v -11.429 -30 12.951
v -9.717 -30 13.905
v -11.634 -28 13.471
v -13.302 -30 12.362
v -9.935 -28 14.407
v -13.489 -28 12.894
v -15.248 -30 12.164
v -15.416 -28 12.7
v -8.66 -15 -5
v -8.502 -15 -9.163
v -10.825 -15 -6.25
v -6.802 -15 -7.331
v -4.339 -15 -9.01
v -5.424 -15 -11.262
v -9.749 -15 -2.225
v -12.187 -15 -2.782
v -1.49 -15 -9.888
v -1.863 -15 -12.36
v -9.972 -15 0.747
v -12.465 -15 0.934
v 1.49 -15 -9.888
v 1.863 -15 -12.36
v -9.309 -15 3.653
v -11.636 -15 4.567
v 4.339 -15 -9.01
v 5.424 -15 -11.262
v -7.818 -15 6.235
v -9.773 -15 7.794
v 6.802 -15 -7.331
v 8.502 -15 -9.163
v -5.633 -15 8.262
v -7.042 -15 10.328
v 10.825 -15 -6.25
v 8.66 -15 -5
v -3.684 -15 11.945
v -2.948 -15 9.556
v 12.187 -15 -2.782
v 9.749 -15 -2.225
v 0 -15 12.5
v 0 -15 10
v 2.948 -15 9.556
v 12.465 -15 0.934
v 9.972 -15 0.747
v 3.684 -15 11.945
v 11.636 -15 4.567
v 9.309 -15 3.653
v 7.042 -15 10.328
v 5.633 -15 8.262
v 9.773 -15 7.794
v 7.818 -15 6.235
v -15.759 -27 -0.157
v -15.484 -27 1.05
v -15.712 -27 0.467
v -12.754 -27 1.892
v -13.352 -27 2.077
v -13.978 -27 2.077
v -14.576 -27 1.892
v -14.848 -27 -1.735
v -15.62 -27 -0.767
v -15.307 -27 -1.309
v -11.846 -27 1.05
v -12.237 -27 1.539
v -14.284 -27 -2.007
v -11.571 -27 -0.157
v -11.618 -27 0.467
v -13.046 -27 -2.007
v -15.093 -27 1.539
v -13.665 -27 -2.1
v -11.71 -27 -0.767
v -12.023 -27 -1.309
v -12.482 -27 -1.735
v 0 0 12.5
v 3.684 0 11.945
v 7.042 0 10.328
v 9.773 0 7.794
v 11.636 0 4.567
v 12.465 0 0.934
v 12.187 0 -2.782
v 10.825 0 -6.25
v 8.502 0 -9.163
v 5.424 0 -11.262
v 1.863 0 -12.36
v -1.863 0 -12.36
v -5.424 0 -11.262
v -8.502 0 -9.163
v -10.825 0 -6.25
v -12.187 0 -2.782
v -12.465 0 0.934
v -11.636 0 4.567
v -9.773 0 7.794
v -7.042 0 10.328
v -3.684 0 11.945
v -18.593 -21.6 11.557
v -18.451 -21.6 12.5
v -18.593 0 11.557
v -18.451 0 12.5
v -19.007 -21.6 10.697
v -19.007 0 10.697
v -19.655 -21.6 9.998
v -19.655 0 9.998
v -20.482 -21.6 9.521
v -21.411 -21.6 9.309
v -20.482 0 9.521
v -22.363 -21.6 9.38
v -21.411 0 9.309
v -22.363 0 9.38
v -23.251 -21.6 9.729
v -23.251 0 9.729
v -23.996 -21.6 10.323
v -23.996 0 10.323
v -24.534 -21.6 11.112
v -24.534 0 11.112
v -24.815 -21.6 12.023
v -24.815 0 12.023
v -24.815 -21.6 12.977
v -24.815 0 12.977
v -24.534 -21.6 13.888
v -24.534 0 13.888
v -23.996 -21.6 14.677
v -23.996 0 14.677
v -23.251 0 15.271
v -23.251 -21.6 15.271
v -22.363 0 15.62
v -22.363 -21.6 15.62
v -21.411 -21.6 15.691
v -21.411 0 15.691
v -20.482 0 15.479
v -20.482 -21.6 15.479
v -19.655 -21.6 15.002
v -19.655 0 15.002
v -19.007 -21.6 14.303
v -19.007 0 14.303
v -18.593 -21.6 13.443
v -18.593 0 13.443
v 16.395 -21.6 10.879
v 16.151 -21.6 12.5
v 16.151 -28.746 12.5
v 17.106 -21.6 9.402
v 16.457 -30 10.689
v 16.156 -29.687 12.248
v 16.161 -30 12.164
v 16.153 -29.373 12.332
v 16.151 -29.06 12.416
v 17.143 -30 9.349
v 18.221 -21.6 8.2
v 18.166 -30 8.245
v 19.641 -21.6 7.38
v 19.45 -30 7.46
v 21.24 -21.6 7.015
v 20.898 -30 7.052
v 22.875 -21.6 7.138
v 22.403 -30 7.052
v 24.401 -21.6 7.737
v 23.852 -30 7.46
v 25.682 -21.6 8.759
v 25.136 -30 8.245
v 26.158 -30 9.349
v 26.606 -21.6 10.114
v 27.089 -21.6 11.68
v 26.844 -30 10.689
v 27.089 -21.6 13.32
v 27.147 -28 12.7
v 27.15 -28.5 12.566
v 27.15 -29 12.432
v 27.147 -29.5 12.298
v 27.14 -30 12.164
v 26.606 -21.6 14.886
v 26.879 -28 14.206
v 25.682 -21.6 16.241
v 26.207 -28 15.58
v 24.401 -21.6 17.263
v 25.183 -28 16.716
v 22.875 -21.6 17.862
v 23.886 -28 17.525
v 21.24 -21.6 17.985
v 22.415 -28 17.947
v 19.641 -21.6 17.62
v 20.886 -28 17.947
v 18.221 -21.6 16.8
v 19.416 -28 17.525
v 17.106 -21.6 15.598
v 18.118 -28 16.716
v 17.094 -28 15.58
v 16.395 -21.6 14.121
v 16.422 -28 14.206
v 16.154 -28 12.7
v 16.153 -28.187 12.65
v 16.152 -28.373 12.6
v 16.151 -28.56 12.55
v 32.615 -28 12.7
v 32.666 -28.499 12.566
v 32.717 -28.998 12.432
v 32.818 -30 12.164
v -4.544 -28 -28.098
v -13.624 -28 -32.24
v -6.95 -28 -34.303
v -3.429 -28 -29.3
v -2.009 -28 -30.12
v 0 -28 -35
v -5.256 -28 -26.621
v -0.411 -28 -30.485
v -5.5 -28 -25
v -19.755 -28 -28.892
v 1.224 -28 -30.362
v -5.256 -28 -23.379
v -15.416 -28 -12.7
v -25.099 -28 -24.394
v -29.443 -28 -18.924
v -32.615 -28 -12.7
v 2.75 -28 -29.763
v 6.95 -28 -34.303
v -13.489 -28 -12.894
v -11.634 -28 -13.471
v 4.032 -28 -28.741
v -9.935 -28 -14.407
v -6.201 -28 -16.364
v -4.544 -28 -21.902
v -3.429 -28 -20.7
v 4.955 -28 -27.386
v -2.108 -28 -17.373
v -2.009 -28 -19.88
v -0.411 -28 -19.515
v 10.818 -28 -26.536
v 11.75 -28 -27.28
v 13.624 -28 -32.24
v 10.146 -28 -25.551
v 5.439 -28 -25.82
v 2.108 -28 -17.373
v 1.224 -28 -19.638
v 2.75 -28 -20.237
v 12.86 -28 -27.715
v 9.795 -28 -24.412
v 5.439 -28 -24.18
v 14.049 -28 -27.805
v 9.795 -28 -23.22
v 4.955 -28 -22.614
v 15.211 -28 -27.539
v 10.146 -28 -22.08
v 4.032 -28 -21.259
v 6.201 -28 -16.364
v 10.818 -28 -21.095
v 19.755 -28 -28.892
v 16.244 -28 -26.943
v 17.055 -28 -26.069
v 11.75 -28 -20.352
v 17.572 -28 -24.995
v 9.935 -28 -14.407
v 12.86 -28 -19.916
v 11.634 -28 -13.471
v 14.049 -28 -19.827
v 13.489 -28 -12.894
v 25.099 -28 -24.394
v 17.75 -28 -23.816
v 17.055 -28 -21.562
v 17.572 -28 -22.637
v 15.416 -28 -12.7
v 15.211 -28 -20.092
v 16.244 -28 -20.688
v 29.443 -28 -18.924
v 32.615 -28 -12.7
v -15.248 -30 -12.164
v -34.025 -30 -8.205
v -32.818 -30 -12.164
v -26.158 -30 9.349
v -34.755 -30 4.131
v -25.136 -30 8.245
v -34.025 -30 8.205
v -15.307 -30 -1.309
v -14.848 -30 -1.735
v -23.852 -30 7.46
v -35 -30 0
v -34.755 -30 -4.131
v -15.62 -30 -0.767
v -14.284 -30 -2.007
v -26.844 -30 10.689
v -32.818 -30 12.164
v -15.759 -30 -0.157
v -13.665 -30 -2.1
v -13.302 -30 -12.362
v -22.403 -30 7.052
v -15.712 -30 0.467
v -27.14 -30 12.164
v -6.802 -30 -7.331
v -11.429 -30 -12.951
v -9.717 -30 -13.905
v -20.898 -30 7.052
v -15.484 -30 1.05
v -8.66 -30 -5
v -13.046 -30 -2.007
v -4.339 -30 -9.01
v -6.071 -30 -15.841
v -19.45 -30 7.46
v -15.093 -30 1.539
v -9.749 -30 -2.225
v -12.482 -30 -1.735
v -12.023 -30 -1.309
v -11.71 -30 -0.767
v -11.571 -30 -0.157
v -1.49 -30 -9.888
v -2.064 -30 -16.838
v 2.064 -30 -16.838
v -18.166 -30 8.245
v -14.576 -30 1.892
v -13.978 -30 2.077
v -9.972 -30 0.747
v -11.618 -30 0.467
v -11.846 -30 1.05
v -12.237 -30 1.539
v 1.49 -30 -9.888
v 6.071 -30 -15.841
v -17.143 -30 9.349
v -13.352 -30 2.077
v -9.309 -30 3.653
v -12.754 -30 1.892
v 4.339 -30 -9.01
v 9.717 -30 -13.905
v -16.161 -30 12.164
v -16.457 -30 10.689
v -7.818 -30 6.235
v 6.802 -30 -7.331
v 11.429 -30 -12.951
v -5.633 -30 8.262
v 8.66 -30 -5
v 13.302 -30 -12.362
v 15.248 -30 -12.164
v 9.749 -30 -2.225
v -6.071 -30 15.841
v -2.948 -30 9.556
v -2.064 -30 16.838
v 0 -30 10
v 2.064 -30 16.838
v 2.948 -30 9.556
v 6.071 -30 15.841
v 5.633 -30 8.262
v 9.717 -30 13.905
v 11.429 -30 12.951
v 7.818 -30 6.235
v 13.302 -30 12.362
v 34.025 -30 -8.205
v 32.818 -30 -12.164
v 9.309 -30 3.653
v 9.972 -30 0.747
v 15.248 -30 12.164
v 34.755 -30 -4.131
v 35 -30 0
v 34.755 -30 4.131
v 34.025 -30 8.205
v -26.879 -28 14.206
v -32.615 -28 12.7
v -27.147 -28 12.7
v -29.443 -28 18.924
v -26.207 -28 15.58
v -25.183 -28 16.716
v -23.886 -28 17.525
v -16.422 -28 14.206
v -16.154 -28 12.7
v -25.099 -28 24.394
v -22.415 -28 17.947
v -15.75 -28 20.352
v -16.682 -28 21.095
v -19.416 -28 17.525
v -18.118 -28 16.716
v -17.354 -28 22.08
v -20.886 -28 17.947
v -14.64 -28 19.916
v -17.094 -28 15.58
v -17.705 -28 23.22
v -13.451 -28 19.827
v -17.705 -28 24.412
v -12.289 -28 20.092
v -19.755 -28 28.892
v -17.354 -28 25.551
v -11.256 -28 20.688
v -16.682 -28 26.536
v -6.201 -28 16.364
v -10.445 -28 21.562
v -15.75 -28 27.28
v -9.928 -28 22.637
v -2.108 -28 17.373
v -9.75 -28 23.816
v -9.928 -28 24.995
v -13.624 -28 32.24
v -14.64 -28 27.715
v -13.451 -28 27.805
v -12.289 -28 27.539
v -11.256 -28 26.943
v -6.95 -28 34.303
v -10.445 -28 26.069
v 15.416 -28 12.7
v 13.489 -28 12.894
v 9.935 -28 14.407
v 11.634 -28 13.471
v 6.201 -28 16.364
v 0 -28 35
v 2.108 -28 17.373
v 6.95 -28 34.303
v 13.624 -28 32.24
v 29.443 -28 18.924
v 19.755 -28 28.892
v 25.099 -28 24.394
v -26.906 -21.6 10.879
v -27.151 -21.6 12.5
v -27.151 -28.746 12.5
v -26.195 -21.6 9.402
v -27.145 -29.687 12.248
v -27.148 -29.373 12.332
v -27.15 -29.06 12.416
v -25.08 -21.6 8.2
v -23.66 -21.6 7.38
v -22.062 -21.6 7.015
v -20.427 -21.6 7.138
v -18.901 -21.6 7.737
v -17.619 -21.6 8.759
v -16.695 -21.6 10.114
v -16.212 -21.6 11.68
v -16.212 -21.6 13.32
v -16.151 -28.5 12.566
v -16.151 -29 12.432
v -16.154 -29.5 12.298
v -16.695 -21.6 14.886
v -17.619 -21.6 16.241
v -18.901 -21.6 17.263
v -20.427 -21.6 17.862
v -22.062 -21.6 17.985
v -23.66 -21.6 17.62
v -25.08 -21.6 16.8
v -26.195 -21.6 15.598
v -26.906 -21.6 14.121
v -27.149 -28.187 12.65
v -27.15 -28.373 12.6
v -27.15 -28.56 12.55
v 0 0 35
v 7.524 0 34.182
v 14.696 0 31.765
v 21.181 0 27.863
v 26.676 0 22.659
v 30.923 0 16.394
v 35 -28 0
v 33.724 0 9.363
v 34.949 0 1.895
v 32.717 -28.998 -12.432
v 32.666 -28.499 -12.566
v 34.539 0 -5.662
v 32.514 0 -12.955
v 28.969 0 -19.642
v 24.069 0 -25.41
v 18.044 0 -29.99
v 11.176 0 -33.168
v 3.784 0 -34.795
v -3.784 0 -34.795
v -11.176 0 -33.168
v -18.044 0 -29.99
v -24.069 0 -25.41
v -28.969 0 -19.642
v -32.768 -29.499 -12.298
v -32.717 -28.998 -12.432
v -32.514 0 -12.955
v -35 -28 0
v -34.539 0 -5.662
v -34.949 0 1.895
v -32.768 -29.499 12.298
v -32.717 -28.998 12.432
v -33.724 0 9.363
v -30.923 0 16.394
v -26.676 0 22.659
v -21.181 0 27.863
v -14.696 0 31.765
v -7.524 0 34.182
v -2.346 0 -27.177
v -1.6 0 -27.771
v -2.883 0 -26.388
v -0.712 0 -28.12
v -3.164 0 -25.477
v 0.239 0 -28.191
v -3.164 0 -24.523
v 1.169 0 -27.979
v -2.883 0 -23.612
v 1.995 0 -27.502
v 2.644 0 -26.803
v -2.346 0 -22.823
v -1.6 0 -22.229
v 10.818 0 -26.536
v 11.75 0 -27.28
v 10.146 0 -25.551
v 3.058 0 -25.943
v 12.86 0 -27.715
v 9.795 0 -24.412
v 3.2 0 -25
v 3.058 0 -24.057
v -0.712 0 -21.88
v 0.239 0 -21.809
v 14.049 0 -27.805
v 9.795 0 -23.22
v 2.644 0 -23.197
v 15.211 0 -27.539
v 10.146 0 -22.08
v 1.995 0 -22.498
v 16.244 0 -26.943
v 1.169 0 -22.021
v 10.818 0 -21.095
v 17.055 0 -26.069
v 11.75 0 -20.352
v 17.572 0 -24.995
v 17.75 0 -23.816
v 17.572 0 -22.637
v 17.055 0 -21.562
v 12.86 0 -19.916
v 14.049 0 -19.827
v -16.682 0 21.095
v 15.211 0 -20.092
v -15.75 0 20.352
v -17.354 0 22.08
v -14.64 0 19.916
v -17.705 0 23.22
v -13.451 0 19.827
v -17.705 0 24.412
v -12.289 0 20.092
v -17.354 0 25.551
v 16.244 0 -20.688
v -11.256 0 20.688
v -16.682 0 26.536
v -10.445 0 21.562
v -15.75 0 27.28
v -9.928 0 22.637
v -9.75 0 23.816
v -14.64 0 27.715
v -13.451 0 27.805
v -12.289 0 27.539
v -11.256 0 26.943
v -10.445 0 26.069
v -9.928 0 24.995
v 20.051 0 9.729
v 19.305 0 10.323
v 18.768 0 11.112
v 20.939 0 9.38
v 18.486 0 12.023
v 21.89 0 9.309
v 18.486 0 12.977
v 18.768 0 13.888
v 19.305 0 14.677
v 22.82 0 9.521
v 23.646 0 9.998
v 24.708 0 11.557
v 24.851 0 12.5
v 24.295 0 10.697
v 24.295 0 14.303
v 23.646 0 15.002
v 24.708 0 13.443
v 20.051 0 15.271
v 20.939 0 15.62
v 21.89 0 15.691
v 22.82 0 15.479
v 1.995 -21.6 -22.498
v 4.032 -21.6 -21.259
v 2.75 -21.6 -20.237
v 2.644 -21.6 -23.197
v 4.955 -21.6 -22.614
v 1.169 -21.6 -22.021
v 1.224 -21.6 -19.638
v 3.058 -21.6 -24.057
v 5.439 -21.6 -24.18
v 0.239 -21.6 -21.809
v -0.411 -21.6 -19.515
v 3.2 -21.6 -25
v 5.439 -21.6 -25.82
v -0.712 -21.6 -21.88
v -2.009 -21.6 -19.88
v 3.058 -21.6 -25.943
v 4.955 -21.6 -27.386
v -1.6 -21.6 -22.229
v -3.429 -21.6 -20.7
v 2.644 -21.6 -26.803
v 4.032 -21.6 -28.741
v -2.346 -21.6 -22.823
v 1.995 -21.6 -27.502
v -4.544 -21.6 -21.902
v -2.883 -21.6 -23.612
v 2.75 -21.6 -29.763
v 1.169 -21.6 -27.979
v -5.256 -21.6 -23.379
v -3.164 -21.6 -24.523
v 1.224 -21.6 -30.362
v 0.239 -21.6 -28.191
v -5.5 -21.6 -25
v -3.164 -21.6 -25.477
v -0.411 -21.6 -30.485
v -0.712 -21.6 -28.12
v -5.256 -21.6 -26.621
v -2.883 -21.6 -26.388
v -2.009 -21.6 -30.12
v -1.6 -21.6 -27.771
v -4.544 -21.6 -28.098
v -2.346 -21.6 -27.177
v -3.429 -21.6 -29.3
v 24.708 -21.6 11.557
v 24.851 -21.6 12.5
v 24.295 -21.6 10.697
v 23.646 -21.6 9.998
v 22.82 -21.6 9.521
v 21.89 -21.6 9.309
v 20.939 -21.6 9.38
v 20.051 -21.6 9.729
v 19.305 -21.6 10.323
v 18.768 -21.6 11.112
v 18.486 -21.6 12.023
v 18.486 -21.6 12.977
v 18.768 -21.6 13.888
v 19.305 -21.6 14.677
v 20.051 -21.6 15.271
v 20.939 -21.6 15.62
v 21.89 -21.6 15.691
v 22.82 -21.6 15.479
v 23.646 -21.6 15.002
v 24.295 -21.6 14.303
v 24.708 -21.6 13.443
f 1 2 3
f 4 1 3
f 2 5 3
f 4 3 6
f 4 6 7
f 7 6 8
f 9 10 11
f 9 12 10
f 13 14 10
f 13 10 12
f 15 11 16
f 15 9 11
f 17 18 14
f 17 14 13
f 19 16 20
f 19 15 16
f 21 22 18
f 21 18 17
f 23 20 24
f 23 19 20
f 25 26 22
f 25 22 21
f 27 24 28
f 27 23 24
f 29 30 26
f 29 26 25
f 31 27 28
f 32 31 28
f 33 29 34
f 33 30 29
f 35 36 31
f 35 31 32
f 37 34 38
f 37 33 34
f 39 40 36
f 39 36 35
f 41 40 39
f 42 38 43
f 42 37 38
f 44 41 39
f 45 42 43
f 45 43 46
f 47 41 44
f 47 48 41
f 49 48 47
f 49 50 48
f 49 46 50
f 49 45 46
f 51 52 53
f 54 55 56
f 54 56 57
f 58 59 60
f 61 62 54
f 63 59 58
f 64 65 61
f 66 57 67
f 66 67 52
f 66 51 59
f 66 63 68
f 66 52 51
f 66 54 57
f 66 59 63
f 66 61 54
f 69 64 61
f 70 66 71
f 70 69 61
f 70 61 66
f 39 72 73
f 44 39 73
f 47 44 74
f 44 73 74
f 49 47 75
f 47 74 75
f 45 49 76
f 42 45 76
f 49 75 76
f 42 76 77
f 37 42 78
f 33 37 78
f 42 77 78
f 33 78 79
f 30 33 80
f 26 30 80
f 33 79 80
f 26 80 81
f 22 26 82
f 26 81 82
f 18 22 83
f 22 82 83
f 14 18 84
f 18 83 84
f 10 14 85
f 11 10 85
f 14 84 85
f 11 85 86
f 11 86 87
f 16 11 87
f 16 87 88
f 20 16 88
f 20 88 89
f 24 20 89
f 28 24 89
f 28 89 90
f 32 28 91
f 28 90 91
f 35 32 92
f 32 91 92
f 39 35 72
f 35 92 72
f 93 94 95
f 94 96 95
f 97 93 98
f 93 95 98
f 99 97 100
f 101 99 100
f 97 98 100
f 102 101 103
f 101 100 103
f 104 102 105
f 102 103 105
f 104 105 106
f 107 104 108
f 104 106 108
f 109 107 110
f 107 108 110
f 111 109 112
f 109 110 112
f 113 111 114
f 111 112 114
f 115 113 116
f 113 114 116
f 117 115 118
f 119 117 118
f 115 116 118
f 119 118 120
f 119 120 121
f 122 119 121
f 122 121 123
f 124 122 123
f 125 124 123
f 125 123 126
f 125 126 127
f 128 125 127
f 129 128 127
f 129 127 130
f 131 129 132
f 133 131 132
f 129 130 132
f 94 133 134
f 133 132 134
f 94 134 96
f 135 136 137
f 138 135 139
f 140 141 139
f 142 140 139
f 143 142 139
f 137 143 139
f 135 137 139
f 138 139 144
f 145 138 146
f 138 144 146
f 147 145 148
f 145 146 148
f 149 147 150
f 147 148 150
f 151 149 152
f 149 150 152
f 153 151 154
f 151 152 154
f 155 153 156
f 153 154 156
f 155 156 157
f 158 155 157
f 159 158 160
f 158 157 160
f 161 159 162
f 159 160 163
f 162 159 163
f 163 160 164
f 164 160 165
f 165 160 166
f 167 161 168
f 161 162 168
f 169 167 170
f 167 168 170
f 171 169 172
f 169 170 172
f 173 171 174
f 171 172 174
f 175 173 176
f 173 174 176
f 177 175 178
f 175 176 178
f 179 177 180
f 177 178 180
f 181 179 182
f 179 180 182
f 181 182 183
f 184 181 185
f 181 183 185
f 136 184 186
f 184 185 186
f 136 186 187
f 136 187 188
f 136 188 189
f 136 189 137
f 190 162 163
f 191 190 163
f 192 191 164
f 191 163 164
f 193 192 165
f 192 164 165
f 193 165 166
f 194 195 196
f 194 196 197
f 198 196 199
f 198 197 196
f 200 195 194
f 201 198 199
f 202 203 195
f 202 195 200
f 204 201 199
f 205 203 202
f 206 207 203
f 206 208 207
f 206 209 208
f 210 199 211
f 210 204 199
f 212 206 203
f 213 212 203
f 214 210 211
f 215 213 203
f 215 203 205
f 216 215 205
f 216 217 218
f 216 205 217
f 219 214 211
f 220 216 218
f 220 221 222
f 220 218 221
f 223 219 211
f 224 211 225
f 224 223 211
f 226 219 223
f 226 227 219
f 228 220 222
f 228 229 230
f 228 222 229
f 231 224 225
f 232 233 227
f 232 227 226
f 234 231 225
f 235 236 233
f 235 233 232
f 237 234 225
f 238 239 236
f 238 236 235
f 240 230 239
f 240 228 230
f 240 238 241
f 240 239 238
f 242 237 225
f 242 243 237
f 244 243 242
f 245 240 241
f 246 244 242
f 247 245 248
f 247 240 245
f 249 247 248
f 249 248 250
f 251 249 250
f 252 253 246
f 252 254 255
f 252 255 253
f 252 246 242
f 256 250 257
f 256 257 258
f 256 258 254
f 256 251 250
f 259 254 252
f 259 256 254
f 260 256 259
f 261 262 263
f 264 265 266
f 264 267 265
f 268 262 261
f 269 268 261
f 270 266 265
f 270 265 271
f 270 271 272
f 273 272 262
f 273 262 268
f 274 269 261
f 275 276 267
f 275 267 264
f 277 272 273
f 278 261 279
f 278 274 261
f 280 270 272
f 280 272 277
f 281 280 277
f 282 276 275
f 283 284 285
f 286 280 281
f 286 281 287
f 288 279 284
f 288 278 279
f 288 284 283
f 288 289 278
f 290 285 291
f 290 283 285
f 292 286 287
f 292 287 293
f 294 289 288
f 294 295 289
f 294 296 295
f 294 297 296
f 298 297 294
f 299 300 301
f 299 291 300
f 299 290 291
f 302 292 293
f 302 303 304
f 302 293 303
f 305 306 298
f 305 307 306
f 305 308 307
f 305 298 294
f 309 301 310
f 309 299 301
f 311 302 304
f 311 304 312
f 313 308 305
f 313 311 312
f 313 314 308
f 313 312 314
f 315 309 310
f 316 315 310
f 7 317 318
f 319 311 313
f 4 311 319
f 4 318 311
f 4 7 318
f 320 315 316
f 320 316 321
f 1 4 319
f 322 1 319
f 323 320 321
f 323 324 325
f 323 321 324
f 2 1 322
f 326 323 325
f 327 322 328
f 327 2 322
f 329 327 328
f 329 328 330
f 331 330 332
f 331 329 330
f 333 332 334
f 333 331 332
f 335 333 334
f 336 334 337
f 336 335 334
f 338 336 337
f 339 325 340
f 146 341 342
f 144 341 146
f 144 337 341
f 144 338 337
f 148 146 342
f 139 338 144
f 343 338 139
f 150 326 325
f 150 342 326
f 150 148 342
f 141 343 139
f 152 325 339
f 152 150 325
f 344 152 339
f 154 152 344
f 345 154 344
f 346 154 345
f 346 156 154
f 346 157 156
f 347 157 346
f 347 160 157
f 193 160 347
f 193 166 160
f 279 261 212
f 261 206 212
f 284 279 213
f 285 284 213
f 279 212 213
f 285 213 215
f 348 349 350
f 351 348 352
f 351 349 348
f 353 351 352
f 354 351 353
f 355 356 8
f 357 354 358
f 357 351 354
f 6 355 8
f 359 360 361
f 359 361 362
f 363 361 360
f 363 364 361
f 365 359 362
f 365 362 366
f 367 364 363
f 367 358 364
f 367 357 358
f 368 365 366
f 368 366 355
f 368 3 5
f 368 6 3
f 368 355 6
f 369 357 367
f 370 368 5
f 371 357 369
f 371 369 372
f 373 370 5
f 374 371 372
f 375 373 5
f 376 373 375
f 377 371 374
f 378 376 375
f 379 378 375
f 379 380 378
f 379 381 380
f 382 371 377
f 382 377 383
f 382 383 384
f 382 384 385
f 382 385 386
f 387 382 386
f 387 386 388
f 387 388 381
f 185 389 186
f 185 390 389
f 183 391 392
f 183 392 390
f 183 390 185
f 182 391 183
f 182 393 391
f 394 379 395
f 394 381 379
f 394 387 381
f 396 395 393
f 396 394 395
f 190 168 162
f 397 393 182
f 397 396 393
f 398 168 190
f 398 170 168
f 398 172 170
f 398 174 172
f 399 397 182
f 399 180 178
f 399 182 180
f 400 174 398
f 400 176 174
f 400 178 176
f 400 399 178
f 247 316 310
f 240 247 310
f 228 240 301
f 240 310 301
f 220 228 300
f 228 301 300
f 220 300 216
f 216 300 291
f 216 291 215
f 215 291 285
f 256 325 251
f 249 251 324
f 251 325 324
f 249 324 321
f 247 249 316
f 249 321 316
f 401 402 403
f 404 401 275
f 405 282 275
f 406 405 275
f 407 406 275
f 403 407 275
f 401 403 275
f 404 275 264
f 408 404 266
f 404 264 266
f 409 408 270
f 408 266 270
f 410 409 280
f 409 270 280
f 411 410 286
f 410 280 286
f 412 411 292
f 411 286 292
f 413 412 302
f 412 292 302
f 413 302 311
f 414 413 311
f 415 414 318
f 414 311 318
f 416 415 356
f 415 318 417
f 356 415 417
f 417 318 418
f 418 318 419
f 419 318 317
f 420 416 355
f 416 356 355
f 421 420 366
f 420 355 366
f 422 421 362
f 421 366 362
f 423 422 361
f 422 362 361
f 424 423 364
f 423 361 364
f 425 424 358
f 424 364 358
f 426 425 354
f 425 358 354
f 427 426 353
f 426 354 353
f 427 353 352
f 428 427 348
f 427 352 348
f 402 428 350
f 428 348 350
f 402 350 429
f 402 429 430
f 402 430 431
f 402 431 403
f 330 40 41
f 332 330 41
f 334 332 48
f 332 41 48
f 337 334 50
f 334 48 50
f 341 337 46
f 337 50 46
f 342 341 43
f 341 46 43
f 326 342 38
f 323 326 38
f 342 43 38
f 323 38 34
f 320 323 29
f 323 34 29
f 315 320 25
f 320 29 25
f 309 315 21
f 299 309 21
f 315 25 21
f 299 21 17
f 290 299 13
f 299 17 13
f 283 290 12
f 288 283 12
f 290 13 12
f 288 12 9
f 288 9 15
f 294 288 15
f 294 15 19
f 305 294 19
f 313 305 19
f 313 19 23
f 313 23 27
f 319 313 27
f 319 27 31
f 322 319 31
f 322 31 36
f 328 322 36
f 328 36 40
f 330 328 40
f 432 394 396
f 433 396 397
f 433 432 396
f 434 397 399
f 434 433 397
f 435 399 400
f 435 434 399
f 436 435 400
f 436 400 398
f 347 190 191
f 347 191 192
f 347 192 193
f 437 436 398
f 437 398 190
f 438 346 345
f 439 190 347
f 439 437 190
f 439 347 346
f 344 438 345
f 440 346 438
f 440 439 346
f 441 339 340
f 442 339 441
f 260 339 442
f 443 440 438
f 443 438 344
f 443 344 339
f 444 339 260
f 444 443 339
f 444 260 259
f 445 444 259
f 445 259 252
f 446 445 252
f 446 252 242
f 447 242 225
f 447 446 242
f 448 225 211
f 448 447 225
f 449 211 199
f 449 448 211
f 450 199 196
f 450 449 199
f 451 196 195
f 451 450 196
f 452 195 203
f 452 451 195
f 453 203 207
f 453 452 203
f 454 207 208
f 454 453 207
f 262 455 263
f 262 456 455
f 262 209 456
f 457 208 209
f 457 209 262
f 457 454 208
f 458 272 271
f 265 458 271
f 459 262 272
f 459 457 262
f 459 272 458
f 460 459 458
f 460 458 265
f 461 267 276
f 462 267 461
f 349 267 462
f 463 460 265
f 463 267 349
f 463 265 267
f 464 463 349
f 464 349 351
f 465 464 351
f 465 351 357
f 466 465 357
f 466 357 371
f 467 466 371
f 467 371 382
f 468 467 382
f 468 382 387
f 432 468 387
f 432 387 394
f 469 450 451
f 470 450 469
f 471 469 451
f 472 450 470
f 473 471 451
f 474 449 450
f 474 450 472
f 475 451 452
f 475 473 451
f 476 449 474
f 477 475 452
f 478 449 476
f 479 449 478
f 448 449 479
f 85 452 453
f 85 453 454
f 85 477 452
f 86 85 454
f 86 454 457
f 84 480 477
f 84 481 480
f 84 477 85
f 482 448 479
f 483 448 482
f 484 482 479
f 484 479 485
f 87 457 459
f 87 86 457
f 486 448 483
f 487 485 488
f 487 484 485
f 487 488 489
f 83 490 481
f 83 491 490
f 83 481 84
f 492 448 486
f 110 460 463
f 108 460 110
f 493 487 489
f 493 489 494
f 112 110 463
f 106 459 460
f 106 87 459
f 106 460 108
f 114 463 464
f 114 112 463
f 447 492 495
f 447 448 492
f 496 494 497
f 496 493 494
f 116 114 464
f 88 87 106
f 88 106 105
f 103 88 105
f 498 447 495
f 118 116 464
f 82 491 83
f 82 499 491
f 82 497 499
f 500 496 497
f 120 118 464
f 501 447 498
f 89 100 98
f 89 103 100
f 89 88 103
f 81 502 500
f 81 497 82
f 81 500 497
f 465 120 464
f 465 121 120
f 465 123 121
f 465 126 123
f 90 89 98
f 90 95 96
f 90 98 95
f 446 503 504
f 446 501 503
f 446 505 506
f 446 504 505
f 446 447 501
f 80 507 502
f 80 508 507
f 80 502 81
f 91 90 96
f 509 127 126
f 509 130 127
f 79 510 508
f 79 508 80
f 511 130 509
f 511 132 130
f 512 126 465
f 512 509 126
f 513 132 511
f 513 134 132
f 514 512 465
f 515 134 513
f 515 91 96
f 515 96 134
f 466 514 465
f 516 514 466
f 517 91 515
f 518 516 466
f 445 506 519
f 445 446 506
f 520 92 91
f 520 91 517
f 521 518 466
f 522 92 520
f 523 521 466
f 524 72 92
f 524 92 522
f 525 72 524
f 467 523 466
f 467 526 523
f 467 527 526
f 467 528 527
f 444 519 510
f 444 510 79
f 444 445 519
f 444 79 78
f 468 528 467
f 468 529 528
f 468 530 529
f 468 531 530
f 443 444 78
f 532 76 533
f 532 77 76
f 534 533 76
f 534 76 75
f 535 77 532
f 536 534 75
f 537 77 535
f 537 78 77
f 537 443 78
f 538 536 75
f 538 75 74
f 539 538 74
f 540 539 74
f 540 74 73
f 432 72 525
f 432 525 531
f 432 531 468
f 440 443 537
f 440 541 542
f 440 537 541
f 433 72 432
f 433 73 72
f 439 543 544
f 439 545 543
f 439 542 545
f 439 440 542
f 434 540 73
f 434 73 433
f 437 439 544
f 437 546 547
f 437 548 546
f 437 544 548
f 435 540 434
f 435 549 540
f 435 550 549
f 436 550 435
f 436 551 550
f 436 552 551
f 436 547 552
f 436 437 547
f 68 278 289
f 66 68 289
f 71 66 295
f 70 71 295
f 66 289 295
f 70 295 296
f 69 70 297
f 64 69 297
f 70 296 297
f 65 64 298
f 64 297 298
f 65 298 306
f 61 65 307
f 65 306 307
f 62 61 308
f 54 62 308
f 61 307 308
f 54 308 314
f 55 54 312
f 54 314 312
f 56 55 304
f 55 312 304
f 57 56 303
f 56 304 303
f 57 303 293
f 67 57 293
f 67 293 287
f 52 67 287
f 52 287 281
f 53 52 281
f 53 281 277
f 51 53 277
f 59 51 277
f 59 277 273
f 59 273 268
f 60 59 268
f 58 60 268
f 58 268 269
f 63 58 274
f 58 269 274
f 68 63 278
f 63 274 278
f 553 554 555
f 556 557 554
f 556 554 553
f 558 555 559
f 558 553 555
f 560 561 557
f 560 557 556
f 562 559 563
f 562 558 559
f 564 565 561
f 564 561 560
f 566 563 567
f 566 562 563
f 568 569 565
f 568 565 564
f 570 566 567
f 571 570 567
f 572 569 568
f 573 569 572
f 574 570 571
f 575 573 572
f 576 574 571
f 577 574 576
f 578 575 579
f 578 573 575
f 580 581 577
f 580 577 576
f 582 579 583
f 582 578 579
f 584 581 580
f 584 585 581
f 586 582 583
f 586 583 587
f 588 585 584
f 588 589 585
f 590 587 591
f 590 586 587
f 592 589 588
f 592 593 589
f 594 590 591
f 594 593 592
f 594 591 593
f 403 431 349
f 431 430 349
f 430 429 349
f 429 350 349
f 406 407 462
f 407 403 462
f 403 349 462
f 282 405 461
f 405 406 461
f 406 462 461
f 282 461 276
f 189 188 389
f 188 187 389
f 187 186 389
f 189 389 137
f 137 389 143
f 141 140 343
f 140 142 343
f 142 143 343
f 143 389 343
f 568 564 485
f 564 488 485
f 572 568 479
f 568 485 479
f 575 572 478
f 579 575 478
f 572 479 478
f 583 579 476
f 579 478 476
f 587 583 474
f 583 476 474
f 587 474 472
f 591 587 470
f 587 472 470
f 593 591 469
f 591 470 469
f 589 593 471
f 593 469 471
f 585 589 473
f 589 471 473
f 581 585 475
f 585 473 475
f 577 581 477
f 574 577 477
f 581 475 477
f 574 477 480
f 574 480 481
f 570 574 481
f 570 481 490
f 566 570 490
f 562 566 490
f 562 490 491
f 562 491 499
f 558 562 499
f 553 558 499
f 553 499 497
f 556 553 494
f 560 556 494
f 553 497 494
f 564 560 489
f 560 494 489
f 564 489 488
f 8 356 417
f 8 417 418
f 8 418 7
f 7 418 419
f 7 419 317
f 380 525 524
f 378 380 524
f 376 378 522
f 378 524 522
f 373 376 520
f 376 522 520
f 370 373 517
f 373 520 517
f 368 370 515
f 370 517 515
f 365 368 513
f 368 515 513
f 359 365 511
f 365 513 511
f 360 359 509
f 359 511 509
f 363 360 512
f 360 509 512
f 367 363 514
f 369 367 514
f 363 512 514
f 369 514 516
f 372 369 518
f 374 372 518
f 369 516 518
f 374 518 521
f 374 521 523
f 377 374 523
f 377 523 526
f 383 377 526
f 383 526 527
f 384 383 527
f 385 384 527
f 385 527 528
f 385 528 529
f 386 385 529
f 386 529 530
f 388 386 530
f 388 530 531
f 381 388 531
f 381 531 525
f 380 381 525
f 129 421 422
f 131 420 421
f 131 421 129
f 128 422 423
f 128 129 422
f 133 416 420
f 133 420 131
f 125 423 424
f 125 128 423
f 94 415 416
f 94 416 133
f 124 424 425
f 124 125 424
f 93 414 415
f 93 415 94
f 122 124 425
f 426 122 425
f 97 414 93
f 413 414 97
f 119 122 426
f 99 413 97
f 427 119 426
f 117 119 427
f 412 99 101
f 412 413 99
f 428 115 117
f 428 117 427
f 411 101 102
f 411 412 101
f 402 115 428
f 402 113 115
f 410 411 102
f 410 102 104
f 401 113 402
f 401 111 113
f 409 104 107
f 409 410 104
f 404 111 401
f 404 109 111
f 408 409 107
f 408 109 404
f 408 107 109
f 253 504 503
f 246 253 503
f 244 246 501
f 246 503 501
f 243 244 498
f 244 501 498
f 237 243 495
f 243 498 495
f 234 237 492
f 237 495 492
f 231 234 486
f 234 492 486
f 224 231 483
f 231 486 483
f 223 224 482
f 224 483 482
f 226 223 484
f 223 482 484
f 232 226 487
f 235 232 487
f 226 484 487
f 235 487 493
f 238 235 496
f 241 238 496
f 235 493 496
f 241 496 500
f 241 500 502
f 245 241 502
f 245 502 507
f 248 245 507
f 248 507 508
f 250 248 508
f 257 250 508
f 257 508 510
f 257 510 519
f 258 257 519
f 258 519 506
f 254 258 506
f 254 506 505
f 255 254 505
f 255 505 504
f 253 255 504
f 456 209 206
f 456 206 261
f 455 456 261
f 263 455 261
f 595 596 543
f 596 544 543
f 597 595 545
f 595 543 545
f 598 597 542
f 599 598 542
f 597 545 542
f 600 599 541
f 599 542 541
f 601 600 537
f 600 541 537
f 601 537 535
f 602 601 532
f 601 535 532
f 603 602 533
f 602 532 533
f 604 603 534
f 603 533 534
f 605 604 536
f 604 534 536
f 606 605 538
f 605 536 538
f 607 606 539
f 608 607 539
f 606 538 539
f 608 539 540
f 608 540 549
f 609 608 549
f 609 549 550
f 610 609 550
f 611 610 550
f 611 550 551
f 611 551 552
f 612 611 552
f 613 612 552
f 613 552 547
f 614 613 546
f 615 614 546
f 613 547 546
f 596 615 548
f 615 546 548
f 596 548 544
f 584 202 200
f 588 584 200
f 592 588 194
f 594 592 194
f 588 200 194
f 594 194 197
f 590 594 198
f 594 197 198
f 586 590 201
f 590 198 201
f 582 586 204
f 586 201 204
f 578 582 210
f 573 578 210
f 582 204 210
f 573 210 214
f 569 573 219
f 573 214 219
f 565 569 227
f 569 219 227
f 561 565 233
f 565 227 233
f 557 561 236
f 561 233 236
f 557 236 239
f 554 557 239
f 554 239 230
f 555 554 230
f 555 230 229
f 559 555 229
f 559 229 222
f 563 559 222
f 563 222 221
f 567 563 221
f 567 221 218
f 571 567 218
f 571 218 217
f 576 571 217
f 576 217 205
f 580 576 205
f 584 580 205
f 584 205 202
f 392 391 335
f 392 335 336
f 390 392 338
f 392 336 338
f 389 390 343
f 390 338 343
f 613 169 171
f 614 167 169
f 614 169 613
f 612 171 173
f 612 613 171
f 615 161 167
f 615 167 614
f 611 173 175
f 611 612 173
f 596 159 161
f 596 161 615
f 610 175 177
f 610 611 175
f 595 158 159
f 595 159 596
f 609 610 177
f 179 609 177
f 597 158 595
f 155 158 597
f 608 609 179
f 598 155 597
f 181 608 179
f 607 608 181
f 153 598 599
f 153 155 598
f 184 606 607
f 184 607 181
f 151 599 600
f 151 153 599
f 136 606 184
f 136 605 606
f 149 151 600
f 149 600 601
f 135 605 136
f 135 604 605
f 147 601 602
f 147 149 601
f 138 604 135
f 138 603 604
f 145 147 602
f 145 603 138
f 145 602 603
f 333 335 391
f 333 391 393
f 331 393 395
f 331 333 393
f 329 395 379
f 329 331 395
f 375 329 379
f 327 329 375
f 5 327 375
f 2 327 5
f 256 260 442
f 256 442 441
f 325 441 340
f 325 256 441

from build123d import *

# Parameters (mm, degrees)
SKETCH1_R                                           = 35
SKETCH1_R_2                                         = 10
BOSS_EXTRUDE1_DEPTH                                 = 30
SKETCH4_R                                           = 12.5
CUT_EXTRUDE2_DEPTH                                  = 15
CBORE_FOR_M6_HEX_SOCKET_HEAD_CAP_SCREW1_D           = 6.4
CBORE_FOR_M6_HEX_SOCKET_HEAD_CAP_SCREW1_CBORE_D     = 11
CBORE_FOR_M6_HEX_SOCKET_HEAD_CAP_SCREW1_CBORE_DEPTH = 8.4
F_8_0MM_DOWEL_HOLE1_D                               = 8
SKETCH14_OUTSIDE_W                                  = 92.688
SKETCH14_OUTSIDE_H                                  = 92.688
SKETCH14_OUTSIDE_W_2                                = 70
SKETCH14_OUTSIDE_H_2                                = 25.4
CUT_EXTRUDE3_DEPTH                                  = 2
SKETCH18_R                                          = 2.1
CUT_EXTRUDE5_DEPTH                                  = 3
CUT_EXTRUDE6_DEPTH                                  = 58.879184825
CUT_EXTRUDE6_DEPTH_BACK                             = 58.879184825
BOSS_EXTRUDE2_DEPTH                                 = 2
DRAFT1_ANGLE                                        = 15
FILLET1_R                                           = 10


with BuildPart() as part:
    # Sketch1 → Boss-Extrude1 (new body)
    with BuildSketch(Plane(origin=(0, 0, 0), x_dir=(1, 0, 0), z_dir=(0, 1, 0))):
        with Locations(Location((0, 0, 0), (0, 0, 270))):
            Circle(SKETCH1_R)
        with Locations(Location((0, 0, 0), (0, 0, 270))):
            Circle(SKETCH1_R_2, mode=Mode.SUBTRACT)
    extrude(amount=-BOSS_EXTRUDE1_DEPTH)

    # Sketch4 → Cut-Extrude2 (cut)
    with BuildSketch(Plane(origin=(0, 0, 0), x_dir=(1, 0, 0), z_dir=(0, 1, 0))):
        with Locations(Location((0, 0, 0), (0, 0, 270))):
            Circle(SKETCH4_R)
    extrude(amount=-CUT_EXTRUDE2_DEPTH, mode=Mode.SUBTRACT)

    # CBORE for M6 Hex Socket Head Cap Screw1 (through all)
    with Locations(Plane(origin=(0, -30, 0), x_dir=(-1, 0, 0), z_dir=(0, -1, 0))):
        with Locations((0, 25), (21.650635095, -12.5), (-21.650635095, -12.5)):
            CounterBoreHole(CBORE_FOR_M6_HEX_SOCKET_HEAD_CAP_SCREW1_D / 2, CBORE_FOR_M6_HEX_SOCKET_HEAD_CAP_SCREW1_CBORE_D / 2, CBORE_FOR_M6_HEX_SOCKET_HEAD_CAP_SCREW1_CBORE_DEPTH)

    # Ø8.0mm Dowel Hole1 (through all)
    with Locations(Plane(origin=(0, -30, 0), x_dir=(-1, 0, 0), z_dir=(0, -1, 0))):
        with Locations((13.75, -23.815698604), (-13.75, 23.815698604)):
            Hole(F_8_0MM_DOWEL_HOLE1_D / 2)

    # Sketch14 outside → Cut-Extrude3 (cut)
    with BuildSketch(Plane.XZ.offset(30)):
        Rectangle(SKETCH14_OUTSIDE_W, SKETCH14_OUTSIDE_H)
        Rectangle(SKETCH14_OUTSIDE_W_2, SKETCH14_OUTSIDE_H_2, mode=Mode.SUBTRACT)
    extrude(amount=-CUT_EXTRUDE3_DEPTH, mode=Mode.SUBTRACT)

    # Sketch18 → Cut-Extrude5 (cut)
    with BuildSketch(Plane.XZ.offset(30)):
        with Locations(Location((-13.665, 0, 0), (0, 0, 270))):
            Circle(SKETCH18_R)
    extrude(amount=-CUT_EXTRUDE5_DEPTH, mode=Mode.SUBTRACT)

    # Sketch19 → Cut-Extrude6 (cut, two sides: drawn at the far end of the back side and taken through both)
    with BuildSketch(Plane(origin=(0, 0, 0), x_dir=(0, 0, -1), z_dir=(1, 0, 0)).offset(-CUT_EXTRUDE6_DEPTH_BACK)):
        Polygon((-12.7, -28), (-12.164101615, -30), (-12.7, -30), align=None)
        Polygon((12.7, -28), (12.164101615, -30), (12.7, -30), align=None)
    extrude(amount=CUT_EXTRUDE6_DEPTH + CUT_EXTRUDE6_DEPTH_BACK, mode=Mode.SUBTRACT)

    # Sketch20 → Boss-Extrude2 (add)
    with BuildSketch(Plane.XZ.offset(30)):
        with BuildLine():
            Line((-12.581122044, 12.164101615), (12.581122044, 12.164101615))
            ThreePointArc((12.581122044, 12.164101615), (0, 17.5), (-12.581122044, 12.164101615))
        make_face()
        with BuildLine():
            Line((-12.581122044, -12.164101615), (12.581122044, -12.164101615))
            ThreePointArc((12.581122044, -12.164101615), (0, -17.5), (-12.581122044, -12.164101615))
        make_face()
    extrude(amount=-BOSS_EXTRUDE2_DEPTH)

    # Draft1
    draft1_faces = [part.faces().sort_by_distance(p)[0] for p in [
        (0, -29, 17.5),
        (0, -29, -17.5),
    ]]
    draft(draft1_faces, Plane(origin=(0, -28, 0), x_dir=(0, 0, -1), z_dir=(0, -1, 0)), DRAFT1_ANGLE)

    # Fillet1
    fillet1_edges = [part.edges().sort_by_distance(p)[0] for p in [
        (11.932625996, -29.000048438, 12.432037829),
        (-11.932625996, -29.000048438, 12.432037829),
        (-11.932625996, -29.000048438, -12.432037829),
        (11.932625996, -29.000048438, -12.432037829),
    ]]
    fillet(fillet1_edges, radius=FILLET1_R)


solid = part.part
